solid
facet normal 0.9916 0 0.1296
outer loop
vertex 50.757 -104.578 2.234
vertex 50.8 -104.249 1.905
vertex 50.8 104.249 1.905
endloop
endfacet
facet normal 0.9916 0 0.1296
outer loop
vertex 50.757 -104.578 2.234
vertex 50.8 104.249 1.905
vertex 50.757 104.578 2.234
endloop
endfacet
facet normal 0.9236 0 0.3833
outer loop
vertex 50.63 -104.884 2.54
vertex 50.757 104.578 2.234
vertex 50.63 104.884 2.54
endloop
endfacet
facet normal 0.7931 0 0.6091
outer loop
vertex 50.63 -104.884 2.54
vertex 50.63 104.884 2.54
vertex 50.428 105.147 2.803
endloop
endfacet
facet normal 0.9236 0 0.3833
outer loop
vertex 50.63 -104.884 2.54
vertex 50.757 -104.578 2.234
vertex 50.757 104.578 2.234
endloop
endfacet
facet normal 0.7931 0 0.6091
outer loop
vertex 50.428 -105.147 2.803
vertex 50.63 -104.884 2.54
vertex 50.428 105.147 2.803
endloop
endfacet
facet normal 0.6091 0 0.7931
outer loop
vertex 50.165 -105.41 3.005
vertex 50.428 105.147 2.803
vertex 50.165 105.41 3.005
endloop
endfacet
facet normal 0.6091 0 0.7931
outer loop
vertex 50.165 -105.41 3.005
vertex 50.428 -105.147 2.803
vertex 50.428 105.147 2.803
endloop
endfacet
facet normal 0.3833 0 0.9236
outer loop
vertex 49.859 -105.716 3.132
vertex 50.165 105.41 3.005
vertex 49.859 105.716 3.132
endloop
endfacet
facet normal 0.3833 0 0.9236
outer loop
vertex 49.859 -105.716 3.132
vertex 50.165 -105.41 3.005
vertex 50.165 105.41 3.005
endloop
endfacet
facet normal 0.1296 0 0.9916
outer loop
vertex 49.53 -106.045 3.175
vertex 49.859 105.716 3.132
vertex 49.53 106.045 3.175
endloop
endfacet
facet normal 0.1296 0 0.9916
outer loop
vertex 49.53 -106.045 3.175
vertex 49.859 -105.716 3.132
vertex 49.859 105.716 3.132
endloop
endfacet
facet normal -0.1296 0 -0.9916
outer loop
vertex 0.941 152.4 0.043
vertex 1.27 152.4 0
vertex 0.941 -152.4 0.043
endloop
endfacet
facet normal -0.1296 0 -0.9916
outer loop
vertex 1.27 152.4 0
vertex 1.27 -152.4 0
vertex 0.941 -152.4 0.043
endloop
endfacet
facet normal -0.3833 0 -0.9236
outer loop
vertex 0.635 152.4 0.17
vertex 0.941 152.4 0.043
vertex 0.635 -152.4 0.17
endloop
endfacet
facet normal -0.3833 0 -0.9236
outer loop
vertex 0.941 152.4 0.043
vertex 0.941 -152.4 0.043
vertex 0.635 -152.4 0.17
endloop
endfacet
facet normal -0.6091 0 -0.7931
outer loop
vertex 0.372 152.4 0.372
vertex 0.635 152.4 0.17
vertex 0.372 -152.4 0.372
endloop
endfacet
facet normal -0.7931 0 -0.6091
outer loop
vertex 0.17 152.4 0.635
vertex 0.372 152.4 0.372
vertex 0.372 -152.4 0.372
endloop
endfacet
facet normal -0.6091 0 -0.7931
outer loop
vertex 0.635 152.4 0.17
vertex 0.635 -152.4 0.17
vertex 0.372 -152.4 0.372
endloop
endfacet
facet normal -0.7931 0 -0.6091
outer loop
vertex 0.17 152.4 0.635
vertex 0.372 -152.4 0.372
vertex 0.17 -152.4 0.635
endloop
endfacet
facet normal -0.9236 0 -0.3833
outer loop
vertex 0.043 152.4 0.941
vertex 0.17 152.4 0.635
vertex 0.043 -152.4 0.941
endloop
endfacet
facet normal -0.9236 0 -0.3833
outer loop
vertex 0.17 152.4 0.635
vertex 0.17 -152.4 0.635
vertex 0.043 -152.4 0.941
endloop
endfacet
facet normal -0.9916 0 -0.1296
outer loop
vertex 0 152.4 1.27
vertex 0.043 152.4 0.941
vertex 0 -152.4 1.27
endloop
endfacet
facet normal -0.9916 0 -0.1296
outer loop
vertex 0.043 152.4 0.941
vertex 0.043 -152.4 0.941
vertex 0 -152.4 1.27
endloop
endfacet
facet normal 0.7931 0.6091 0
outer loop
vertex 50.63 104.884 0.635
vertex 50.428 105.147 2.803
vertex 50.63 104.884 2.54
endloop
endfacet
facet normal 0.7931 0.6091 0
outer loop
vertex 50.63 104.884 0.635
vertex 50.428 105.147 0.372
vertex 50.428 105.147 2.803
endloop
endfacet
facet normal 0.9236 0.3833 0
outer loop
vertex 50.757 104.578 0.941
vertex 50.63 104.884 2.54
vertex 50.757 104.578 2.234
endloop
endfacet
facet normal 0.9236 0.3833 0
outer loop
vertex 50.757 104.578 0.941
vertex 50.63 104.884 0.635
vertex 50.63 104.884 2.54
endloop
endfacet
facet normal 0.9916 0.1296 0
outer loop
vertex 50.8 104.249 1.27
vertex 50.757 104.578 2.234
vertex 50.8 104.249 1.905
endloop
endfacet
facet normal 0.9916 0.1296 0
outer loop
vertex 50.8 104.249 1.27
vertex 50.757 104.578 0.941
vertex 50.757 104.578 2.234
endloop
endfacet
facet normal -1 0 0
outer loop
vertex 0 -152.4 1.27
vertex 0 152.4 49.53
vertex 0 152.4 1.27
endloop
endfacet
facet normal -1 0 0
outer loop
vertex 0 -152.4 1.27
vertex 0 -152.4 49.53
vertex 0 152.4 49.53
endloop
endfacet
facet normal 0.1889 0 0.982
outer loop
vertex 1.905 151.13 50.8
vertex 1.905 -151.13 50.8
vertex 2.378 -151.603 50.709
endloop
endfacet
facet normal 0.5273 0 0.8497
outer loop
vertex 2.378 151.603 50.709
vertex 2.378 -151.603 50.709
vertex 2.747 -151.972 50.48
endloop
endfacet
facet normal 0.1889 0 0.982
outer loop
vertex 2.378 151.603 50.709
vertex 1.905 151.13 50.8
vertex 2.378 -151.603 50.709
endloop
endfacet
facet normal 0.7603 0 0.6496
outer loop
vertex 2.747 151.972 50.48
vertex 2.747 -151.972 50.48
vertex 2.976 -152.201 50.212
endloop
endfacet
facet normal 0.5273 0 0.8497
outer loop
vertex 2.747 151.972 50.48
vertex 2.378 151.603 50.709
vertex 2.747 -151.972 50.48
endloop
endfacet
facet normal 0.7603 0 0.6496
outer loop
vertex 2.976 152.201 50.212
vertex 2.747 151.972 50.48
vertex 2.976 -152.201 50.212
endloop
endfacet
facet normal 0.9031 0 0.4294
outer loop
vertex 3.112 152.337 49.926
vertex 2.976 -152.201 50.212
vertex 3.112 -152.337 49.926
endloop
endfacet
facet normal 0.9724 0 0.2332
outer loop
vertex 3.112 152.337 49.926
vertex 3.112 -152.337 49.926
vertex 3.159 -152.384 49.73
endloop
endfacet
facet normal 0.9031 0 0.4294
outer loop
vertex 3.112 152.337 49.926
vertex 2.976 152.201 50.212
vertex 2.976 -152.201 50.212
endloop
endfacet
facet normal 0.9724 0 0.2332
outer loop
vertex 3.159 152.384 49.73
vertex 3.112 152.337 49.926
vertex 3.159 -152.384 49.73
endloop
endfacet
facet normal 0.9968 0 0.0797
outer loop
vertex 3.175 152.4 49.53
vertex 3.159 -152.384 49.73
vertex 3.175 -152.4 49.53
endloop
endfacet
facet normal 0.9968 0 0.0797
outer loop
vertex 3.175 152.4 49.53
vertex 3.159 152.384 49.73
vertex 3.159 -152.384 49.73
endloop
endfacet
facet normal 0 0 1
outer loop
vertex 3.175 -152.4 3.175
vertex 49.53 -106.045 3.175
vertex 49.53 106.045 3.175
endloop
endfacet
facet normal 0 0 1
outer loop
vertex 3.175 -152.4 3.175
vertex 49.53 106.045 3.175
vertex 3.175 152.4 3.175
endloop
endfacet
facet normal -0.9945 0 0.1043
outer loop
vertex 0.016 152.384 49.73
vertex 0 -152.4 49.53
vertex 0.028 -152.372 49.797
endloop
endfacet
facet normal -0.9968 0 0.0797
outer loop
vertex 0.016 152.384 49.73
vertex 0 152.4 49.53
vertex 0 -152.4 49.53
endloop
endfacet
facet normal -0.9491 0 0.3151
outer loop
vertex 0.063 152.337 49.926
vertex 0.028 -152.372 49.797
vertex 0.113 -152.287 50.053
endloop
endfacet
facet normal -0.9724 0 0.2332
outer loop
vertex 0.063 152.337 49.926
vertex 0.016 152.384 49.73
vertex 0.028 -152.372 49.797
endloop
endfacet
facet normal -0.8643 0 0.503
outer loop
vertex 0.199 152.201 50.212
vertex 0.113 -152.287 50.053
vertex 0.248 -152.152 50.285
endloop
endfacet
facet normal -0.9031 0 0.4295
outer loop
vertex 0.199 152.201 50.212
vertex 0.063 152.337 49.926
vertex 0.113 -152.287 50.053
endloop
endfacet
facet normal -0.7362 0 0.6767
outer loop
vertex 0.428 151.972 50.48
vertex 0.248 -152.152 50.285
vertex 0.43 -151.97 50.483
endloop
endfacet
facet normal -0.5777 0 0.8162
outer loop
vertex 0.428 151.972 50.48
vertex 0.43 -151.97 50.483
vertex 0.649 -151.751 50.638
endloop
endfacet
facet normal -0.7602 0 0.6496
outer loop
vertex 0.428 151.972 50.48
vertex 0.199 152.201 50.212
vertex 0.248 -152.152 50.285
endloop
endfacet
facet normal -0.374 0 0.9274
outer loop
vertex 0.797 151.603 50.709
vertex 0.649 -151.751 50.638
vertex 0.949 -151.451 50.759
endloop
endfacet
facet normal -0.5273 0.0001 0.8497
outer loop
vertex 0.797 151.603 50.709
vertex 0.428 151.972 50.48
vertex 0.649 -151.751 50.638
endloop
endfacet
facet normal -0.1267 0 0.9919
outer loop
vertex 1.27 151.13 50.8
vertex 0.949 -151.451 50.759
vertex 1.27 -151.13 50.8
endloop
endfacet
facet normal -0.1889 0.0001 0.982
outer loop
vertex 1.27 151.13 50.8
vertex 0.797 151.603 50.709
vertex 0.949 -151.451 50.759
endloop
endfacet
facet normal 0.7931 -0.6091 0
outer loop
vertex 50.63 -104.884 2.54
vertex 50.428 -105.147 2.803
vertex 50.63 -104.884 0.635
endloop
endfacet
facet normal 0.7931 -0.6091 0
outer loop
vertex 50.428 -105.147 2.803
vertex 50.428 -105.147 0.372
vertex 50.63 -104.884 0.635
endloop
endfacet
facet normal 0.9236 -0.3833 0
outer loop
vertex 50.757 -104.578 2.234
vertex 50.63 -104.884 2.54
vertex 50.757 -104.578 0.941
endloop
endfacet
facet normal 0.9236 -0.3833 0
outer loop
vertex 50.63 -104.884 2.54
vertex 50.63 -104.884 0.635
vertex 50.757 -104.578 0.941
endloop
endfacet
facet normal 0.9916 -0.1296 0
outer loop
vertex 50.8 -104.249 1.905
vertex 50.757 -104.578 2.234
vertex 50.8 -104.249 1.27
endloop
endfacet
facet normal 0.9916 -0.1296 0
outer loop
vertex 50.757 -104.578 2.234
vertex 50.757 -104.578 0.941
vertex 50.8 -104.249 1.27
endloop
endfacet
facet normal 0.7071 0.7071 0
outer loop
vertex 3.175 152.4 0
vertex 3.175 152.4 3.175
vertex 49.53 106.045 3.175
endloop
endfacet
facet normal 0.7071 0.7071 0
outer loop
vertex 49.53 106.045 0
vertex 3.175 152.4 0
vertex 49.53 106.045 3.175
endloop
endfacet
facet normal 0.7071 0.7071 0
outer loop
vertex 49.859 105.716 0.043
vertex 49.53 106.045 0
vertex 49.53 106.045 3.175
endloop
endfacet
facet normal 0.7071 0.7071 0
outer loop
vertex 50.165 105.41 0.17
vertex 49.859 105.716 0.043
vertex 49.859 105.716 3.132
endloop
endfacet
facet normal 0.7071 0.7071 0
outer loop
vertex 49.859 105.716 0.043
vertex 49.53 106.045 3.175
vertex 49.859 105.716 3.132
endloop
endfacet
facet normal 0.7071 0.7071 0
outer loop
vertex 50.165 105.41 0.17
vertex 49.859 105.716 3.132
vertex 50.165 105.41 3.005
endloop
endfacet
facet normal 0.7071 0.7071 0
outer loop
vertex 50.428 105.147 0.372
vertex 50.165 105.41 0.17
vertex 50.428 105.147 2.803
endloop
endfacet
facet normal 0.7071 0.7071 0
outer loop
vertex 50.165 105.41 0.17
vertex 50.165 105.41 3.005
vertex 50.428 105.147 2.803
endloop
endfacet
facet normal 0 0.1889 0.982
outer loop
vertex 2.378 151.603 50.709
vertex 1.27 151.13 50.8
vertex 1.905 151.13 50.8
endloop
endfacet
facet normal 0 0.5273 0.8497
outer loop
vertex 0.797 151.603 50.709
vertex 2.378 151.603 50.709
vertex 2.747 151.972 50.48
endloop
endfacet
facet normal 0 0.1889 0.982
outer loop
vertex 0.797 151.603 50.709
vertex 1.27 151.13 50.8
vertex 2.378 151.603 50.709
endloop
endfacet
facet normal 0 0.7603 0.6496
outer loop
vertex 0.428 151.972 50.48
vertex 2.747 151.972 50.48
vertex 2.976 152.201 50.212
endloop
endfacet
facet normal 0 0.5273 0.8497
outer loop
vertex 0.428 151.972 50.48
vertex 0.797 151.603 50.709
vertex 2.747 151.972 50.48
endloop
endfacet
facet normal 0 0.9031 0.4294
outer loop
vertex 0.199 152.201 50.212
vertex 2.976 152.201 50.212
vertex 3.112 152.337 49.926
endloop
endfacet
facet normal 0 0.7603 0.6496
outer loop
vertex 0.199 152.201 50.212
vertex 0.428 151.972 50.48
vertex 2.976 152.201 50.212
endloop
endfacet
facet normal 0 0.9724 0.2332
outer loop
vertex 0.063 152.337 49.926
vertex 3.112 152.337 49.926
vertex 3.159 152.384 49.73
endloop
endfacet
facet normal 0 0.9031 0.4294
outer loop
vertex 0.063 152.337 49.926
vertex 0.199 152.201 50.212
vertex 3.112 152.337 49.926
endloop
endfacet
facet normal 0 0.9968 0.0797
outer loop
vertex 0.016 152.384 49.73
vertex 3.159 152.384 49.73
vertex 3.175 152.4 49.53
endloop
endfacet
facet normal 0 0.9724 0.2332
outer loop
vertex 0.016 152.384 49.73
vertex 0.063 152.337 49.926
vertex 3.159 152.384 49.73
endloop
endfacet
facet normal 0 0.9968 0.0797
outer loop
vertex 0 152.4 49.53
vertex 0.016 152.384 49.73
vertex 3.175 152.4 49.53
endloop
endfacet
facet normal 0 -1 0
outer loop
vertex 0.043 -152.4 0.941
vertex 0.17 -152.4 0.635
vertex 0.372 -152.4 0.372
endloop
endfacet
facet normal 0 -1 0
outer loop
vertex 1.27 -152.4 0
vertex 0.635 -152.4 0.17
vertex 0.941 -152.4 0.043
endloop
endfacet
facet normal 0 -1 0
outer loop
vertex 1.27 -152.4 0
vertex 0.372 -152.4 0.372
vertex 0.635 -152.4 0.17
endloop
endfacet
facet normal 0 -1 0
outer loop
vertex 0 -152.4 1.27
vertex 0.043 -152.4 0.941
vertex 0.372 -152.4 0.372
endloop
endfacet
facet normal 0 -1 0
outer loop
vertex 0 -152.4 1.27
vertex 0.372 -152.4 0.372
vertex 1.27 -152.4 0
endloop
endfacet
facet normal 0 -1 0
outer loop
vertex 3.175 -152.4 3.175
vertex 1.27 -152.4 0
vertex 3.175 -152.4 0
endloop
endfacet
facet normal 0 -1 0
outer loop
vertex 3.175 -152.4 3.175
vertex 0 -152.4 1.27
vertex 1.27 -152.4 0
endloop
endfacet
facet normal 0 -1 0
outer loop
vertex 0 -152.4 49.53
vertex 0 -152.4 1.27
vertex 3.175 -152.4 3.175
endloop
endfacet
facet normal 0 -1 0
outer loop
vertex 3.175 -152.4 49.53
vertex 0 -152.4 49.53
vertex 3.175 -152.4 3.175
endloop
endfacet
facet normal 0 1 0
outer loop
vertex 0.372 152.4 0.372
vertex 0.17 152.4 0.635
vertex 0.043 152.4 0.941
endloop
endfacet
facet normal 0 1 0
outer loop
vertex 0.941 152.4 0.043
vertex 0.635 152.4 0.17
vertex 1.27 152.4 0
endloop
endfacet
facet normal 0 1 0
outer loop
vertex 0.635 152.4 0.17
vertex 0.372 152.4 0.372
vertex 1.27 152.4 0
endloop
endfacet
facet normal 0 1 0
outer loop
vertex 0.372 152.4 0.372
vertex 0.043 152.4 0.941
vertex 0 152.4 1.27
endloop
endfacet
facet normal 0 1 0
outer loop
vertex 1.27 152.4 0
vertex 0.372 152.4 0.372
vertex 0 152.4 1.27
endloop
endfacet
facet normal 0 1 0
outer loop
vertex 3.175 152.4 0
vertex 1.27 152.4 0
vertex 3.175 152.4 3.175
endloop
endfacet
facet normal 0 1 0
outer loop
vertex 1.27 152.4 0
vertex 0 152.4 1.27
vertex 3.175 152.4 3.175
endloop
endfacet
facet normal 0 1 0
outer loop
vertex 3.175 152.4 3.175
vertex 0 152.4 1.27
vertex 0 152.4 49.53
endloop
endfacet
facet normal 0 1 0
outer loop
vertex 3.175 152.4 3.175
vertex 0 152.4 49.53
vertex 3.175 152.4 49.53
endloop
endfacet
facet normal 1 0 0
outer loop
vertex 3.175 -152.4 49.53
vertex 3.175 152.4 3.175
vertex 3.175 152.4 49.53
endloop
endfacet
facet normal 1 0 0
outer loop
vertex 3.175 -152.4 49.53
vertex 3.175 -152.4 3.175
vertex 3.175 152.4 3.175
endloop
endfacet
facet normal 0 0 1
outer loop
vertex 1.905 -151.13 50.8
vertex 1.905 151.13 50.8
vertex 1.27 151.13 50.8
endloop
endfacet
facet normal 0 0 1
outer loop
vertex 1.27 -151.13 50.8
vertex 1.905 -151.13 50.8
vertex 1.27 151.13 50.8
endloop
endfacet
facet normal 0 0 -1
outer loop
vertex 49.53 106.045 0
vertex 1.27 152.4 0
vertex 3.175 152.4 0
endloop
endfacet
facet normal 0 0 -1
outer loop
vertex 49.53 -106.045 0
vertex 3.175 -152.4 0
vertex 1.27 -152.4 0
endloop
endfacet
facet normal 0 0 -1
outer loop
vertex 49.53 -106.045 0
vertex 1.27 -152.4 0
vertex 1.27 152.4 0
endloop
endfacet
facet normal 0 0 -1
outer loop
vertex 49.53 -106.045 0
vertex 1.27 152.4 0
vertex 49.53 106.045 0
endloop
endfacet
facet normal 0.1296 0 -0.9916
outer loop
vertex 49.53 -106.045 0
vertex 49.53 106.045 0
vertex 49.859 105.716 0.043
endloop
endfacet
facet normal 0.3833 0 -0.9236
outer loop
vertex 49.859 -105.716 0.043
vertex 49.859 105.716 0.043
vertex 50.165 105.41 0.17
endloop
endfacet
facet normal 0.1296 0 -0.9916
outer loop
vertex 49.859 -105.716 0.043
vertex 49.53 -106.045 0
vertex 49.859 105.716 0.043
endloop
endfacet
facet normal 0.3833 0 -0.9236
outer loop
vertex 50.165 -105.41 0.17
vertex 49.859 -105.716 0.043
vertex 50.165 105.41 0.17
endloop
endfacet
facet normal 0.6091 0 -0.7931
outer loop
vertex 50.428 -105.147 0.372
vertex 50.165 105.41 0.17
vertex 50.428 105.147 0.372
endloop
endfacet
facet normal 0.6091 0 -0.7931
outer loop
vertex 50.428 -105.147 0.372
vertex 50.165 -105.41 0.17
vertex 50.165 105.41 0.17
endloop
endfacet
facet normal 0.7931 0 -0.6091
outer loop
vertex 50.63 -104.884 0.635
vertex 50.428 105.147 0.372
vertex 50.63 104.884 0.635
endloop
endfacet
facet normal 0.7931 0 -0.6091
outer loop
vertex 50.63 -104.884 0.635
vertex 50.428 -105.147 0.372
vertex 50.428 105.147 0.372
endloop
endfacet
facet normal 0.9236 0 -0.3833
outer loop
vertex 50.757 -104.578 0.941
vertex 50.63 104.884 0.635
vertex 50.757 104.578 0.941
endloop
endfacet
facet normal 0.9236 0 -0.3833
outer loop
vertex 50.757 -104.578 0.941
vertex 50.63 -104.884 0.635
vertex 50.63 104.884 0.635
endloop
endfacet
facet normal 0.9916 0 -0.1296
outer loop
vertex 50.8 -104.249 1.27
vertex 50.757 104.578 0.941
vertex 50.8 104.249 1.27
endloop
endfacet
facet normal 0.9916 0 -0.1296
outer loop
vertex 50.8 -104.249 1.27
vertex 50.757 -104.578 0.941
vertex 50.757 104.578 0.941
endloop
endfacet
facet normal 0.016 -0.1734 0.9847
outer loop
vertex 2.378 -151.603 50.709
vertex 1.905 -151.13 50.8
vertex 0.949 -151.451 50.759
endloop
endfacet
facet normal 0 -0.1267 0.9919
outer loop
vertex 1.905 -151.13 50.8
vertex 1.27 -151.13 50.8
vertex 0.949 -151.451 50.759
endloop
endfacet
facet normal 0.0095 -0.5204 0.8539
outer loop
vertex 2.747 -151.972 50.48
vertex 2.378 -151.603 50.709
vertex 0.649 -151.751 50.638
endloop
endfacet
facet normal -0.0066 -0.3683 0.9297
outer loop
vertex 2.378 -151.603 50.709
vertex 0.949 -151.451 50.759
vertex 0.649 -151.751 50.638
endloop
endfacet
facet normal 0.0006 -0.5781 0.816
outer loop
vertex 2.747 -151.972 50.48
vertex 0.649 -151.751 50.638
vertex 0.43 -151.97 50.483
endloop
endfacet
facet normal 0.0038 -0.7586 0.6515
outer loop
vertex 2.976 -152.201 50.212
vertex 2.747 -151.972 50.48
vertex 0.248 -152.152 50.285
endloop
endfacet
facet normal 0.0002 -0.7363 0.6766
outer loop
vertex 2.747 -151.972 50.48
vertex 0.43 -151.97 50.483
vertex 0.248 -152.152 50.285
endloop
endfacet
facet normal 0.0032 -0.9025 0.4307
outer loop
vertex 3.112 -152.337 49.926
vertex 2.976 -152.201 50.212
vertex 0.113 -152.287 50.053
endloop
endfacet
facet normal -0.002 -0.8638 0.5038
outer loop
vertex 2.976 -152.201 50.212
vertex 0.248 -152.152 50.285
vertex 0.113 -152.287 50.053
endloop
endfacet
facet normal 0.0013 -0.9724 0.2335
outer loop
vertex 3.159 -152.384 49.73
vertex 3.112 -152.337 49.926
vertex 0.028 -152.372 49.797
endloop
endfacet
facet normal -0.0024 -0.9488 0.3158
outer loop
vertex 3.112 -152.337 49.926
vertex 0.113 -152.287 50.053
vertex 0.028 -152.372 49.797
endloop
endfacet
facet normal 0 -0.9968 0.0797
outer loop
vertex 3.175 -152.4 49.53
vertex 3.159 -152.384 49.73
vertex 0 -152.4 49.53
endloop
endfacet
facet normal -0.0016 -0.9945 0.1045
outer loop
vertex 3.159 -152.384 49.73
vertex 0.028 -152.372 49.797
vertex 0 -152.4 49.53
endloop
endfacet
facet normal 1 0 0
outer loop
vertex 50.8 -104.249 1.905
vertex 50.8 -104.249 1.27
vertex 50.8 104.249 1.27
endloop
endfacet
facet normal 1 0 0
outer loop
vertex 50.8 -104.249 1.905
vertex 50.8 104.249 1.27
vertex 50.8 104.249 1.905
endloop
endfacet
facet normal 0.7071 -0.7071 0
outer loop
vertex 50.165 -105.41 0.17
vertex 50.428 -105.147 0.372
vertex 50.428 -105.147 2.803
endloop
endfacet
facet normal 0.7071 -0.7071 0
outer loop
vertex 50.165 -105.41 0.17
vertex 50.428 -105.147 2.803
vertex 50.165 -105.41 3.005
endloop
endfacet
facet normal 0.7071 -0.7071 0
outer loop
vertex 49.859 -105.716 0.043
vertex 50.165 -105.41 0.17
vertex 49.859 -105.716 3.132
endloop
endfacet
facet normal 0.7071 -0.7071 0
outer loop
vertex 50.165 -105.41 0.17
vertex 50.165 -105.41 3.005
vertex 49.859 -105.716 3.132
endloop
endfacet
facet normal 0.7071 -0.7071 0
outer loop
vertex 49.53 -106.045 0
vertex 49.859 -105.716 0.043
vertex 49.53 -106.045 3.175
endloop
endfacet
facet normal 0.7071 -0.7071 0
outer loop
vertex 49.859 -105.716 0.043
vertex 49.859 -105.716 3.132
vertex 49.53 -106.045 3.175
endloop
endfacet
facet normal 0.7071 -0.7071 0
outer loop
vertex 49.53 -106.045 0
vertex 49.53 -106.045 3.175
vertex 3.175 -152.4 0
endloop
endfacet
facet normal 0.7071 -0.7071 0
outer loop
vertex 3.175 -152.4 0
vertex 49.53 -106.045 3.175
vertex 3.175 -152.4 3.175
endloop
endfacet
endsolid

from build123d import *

# Parameters (mm, degrees)
F1_DEPTH = 152.4
F3_R     = 1.27
F4_DEPTH = 3.81
F6_DEPTH = 3.81
F7_R     = 1.27
F8_R     = 1.27


with BuildPart() as f1:
    # F0 (on Front) → F1 (new body, symmetric)
    with BuildSketch(Plane.XZ):
        Polygon((0, 50.8), (0, 0), (50.8, 0), (50.8, 3.175), (3.175, 3.175), (3.175, 50.8), align=None)
    extrude(amount=F1_DEPTH, both=True)

    # F3
    f3_edges = [f1.edges().sort_by_distance(p)[0] for p in [
        (3.175, 0, 50.8),
        (1.5875, 152.4, 50.8),
        (0, 0, 50.8),
        (1.5875, -152.4, 50.8),
    ]]
    fillet(f3_edges, radius=F3_R)

    # F2 (on face) → F4 (cut)
    with BuildSketch(Plane.XY.offset(3.175)):
        Polygon((50.8, 152.4), (3.175, 152.4), (50.8, 104.775), align=None)
    extrude(amount=-F4_DEPTH, mode=Mode.SUBTRACT)

    # F5 (on face) → F6 (cut)
    with BuildSketch(Plane.XY.offset(3.175)):
        Polygon((50.8, -104.775), (3.175, -152.4), (50.8, -152.4), align=None)
    extrude(amount=-F6_DEPTH, mode=Mode.SUBTRACT)

    # F7
    f7_edges = [f1.edges().sort_by_distance(p)[0] for p in [
        (50.8, -104.775, 1.5875),
        (50.8, 0, 3.175),
        (50.8, 104.775, 1.5875),
        (50.8, 0, 0),
    ]]
    fillet(f7_edges, radius=F7_R)

    # F8
    f8_edges = [f1.edges().sort_by_distance(p)[0] for p in [
        (0, 0, 0),
    ]]
    fillet(f8_edges, radius=F8_R)


solid = f1.part
